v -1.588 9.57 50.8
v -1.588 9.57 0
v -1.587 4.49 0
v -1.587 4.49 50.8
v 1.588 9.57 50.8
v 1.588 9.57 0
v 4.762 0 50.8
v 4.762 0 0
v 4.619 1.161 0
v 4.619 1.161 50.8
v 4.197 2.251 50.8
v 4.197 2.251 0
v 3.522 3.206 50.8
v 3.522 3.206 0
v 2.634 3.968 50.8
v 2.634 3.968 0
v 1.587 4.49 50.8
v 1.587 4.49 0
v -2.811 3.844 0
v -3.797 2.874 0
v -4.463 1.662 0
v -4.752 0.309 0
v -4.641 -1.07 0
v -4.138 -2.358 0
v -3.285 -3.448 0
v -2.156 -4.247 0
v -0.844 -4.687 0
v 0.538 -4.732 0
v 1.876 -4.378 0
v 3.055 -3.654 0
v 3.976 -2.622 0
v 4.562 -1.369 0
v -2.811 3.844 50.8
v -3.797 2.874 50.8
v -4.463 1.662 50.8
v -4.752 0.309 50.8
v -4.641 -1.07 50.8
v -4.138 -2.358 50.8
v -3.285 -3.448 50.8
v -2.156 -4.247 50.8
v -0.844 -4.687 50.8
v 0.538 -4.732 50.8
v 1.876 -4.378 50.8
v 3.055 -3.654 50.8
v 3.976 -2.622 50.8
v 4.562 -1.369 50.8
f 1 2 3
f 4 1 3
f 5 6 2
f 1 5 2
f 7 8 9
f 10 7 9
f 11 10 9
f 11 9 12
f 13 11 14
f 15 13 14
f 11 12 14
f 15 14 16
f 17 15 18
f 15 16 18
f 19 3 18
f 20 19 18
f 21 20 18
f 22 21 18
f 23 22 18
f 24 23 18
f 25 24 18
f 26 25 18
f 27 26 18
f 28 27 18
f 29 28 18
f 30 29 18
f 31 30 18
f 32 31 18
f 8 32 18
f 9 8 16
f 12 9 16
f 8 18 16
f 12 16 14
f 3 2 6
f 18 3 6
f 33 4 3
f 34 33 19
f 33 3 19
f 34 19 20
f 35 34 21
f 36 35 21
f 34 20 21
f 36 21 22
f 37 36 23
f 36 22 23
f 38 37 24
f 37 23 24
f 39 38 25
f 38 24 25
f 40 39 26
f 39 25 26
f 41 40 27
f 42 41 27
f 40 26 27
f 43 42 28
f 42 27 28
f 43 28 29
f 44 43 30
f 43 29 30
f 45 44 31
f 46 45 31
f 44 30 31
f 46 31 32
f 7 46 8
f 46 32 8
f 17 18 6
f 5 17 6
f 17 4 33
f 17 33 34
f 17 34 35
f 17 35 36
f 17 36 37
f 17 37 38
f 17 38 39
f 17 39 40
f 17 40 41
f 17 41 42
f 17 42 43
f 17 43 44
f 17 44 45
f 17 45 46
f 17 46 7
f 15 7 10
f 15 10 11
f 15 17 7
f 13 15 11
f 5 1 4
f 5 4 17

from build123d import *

# Parameters (mm, degrees)
F1_DEPTH = 50.8


with BuildPart() as f1:
    # F0 (on Top) → F1 (new body)
    with BuildSketch(Plane.XY):
        with BuildLine():
            ThreePointArc((-1.5875, 4.4901280605), (-2.749630657, -3.8885649667), (4.7625, 0))
            ThreePointArc((4.7625, 0), (3.8885649667, 2.749630657), (1.5875, 4.4901280605))
            Line((1.5875, 4.4901280605), (-1.5875, 4.4901280605))
        make_face()
        with BuildLine():
            Line((-1.5875, 4.4901280605), (1.5875, 4.4901280605))
            ThreePointArc((1.5875, 4.4901280605), (0, 4.7625), (-1.5875, 4.4901280605))
        make_face()
        with BuildLine():
            ThreePointArc((-1.5875, 4.4901280605), (0, 4.7625), (1.5875, 4.4901280605))
            Line((1.5875, 4.4901280605), (1.5875, 9.5701280605))
            Line((1.5875, 9.5701280605), (-1.5875, 9.5701280605))
            Line((-1.5875, 9.5701280605), (-1.5875, 4.4901280605))
        make_face()
    extrude(amount=F1_DEPTH)


solid = f1.part
